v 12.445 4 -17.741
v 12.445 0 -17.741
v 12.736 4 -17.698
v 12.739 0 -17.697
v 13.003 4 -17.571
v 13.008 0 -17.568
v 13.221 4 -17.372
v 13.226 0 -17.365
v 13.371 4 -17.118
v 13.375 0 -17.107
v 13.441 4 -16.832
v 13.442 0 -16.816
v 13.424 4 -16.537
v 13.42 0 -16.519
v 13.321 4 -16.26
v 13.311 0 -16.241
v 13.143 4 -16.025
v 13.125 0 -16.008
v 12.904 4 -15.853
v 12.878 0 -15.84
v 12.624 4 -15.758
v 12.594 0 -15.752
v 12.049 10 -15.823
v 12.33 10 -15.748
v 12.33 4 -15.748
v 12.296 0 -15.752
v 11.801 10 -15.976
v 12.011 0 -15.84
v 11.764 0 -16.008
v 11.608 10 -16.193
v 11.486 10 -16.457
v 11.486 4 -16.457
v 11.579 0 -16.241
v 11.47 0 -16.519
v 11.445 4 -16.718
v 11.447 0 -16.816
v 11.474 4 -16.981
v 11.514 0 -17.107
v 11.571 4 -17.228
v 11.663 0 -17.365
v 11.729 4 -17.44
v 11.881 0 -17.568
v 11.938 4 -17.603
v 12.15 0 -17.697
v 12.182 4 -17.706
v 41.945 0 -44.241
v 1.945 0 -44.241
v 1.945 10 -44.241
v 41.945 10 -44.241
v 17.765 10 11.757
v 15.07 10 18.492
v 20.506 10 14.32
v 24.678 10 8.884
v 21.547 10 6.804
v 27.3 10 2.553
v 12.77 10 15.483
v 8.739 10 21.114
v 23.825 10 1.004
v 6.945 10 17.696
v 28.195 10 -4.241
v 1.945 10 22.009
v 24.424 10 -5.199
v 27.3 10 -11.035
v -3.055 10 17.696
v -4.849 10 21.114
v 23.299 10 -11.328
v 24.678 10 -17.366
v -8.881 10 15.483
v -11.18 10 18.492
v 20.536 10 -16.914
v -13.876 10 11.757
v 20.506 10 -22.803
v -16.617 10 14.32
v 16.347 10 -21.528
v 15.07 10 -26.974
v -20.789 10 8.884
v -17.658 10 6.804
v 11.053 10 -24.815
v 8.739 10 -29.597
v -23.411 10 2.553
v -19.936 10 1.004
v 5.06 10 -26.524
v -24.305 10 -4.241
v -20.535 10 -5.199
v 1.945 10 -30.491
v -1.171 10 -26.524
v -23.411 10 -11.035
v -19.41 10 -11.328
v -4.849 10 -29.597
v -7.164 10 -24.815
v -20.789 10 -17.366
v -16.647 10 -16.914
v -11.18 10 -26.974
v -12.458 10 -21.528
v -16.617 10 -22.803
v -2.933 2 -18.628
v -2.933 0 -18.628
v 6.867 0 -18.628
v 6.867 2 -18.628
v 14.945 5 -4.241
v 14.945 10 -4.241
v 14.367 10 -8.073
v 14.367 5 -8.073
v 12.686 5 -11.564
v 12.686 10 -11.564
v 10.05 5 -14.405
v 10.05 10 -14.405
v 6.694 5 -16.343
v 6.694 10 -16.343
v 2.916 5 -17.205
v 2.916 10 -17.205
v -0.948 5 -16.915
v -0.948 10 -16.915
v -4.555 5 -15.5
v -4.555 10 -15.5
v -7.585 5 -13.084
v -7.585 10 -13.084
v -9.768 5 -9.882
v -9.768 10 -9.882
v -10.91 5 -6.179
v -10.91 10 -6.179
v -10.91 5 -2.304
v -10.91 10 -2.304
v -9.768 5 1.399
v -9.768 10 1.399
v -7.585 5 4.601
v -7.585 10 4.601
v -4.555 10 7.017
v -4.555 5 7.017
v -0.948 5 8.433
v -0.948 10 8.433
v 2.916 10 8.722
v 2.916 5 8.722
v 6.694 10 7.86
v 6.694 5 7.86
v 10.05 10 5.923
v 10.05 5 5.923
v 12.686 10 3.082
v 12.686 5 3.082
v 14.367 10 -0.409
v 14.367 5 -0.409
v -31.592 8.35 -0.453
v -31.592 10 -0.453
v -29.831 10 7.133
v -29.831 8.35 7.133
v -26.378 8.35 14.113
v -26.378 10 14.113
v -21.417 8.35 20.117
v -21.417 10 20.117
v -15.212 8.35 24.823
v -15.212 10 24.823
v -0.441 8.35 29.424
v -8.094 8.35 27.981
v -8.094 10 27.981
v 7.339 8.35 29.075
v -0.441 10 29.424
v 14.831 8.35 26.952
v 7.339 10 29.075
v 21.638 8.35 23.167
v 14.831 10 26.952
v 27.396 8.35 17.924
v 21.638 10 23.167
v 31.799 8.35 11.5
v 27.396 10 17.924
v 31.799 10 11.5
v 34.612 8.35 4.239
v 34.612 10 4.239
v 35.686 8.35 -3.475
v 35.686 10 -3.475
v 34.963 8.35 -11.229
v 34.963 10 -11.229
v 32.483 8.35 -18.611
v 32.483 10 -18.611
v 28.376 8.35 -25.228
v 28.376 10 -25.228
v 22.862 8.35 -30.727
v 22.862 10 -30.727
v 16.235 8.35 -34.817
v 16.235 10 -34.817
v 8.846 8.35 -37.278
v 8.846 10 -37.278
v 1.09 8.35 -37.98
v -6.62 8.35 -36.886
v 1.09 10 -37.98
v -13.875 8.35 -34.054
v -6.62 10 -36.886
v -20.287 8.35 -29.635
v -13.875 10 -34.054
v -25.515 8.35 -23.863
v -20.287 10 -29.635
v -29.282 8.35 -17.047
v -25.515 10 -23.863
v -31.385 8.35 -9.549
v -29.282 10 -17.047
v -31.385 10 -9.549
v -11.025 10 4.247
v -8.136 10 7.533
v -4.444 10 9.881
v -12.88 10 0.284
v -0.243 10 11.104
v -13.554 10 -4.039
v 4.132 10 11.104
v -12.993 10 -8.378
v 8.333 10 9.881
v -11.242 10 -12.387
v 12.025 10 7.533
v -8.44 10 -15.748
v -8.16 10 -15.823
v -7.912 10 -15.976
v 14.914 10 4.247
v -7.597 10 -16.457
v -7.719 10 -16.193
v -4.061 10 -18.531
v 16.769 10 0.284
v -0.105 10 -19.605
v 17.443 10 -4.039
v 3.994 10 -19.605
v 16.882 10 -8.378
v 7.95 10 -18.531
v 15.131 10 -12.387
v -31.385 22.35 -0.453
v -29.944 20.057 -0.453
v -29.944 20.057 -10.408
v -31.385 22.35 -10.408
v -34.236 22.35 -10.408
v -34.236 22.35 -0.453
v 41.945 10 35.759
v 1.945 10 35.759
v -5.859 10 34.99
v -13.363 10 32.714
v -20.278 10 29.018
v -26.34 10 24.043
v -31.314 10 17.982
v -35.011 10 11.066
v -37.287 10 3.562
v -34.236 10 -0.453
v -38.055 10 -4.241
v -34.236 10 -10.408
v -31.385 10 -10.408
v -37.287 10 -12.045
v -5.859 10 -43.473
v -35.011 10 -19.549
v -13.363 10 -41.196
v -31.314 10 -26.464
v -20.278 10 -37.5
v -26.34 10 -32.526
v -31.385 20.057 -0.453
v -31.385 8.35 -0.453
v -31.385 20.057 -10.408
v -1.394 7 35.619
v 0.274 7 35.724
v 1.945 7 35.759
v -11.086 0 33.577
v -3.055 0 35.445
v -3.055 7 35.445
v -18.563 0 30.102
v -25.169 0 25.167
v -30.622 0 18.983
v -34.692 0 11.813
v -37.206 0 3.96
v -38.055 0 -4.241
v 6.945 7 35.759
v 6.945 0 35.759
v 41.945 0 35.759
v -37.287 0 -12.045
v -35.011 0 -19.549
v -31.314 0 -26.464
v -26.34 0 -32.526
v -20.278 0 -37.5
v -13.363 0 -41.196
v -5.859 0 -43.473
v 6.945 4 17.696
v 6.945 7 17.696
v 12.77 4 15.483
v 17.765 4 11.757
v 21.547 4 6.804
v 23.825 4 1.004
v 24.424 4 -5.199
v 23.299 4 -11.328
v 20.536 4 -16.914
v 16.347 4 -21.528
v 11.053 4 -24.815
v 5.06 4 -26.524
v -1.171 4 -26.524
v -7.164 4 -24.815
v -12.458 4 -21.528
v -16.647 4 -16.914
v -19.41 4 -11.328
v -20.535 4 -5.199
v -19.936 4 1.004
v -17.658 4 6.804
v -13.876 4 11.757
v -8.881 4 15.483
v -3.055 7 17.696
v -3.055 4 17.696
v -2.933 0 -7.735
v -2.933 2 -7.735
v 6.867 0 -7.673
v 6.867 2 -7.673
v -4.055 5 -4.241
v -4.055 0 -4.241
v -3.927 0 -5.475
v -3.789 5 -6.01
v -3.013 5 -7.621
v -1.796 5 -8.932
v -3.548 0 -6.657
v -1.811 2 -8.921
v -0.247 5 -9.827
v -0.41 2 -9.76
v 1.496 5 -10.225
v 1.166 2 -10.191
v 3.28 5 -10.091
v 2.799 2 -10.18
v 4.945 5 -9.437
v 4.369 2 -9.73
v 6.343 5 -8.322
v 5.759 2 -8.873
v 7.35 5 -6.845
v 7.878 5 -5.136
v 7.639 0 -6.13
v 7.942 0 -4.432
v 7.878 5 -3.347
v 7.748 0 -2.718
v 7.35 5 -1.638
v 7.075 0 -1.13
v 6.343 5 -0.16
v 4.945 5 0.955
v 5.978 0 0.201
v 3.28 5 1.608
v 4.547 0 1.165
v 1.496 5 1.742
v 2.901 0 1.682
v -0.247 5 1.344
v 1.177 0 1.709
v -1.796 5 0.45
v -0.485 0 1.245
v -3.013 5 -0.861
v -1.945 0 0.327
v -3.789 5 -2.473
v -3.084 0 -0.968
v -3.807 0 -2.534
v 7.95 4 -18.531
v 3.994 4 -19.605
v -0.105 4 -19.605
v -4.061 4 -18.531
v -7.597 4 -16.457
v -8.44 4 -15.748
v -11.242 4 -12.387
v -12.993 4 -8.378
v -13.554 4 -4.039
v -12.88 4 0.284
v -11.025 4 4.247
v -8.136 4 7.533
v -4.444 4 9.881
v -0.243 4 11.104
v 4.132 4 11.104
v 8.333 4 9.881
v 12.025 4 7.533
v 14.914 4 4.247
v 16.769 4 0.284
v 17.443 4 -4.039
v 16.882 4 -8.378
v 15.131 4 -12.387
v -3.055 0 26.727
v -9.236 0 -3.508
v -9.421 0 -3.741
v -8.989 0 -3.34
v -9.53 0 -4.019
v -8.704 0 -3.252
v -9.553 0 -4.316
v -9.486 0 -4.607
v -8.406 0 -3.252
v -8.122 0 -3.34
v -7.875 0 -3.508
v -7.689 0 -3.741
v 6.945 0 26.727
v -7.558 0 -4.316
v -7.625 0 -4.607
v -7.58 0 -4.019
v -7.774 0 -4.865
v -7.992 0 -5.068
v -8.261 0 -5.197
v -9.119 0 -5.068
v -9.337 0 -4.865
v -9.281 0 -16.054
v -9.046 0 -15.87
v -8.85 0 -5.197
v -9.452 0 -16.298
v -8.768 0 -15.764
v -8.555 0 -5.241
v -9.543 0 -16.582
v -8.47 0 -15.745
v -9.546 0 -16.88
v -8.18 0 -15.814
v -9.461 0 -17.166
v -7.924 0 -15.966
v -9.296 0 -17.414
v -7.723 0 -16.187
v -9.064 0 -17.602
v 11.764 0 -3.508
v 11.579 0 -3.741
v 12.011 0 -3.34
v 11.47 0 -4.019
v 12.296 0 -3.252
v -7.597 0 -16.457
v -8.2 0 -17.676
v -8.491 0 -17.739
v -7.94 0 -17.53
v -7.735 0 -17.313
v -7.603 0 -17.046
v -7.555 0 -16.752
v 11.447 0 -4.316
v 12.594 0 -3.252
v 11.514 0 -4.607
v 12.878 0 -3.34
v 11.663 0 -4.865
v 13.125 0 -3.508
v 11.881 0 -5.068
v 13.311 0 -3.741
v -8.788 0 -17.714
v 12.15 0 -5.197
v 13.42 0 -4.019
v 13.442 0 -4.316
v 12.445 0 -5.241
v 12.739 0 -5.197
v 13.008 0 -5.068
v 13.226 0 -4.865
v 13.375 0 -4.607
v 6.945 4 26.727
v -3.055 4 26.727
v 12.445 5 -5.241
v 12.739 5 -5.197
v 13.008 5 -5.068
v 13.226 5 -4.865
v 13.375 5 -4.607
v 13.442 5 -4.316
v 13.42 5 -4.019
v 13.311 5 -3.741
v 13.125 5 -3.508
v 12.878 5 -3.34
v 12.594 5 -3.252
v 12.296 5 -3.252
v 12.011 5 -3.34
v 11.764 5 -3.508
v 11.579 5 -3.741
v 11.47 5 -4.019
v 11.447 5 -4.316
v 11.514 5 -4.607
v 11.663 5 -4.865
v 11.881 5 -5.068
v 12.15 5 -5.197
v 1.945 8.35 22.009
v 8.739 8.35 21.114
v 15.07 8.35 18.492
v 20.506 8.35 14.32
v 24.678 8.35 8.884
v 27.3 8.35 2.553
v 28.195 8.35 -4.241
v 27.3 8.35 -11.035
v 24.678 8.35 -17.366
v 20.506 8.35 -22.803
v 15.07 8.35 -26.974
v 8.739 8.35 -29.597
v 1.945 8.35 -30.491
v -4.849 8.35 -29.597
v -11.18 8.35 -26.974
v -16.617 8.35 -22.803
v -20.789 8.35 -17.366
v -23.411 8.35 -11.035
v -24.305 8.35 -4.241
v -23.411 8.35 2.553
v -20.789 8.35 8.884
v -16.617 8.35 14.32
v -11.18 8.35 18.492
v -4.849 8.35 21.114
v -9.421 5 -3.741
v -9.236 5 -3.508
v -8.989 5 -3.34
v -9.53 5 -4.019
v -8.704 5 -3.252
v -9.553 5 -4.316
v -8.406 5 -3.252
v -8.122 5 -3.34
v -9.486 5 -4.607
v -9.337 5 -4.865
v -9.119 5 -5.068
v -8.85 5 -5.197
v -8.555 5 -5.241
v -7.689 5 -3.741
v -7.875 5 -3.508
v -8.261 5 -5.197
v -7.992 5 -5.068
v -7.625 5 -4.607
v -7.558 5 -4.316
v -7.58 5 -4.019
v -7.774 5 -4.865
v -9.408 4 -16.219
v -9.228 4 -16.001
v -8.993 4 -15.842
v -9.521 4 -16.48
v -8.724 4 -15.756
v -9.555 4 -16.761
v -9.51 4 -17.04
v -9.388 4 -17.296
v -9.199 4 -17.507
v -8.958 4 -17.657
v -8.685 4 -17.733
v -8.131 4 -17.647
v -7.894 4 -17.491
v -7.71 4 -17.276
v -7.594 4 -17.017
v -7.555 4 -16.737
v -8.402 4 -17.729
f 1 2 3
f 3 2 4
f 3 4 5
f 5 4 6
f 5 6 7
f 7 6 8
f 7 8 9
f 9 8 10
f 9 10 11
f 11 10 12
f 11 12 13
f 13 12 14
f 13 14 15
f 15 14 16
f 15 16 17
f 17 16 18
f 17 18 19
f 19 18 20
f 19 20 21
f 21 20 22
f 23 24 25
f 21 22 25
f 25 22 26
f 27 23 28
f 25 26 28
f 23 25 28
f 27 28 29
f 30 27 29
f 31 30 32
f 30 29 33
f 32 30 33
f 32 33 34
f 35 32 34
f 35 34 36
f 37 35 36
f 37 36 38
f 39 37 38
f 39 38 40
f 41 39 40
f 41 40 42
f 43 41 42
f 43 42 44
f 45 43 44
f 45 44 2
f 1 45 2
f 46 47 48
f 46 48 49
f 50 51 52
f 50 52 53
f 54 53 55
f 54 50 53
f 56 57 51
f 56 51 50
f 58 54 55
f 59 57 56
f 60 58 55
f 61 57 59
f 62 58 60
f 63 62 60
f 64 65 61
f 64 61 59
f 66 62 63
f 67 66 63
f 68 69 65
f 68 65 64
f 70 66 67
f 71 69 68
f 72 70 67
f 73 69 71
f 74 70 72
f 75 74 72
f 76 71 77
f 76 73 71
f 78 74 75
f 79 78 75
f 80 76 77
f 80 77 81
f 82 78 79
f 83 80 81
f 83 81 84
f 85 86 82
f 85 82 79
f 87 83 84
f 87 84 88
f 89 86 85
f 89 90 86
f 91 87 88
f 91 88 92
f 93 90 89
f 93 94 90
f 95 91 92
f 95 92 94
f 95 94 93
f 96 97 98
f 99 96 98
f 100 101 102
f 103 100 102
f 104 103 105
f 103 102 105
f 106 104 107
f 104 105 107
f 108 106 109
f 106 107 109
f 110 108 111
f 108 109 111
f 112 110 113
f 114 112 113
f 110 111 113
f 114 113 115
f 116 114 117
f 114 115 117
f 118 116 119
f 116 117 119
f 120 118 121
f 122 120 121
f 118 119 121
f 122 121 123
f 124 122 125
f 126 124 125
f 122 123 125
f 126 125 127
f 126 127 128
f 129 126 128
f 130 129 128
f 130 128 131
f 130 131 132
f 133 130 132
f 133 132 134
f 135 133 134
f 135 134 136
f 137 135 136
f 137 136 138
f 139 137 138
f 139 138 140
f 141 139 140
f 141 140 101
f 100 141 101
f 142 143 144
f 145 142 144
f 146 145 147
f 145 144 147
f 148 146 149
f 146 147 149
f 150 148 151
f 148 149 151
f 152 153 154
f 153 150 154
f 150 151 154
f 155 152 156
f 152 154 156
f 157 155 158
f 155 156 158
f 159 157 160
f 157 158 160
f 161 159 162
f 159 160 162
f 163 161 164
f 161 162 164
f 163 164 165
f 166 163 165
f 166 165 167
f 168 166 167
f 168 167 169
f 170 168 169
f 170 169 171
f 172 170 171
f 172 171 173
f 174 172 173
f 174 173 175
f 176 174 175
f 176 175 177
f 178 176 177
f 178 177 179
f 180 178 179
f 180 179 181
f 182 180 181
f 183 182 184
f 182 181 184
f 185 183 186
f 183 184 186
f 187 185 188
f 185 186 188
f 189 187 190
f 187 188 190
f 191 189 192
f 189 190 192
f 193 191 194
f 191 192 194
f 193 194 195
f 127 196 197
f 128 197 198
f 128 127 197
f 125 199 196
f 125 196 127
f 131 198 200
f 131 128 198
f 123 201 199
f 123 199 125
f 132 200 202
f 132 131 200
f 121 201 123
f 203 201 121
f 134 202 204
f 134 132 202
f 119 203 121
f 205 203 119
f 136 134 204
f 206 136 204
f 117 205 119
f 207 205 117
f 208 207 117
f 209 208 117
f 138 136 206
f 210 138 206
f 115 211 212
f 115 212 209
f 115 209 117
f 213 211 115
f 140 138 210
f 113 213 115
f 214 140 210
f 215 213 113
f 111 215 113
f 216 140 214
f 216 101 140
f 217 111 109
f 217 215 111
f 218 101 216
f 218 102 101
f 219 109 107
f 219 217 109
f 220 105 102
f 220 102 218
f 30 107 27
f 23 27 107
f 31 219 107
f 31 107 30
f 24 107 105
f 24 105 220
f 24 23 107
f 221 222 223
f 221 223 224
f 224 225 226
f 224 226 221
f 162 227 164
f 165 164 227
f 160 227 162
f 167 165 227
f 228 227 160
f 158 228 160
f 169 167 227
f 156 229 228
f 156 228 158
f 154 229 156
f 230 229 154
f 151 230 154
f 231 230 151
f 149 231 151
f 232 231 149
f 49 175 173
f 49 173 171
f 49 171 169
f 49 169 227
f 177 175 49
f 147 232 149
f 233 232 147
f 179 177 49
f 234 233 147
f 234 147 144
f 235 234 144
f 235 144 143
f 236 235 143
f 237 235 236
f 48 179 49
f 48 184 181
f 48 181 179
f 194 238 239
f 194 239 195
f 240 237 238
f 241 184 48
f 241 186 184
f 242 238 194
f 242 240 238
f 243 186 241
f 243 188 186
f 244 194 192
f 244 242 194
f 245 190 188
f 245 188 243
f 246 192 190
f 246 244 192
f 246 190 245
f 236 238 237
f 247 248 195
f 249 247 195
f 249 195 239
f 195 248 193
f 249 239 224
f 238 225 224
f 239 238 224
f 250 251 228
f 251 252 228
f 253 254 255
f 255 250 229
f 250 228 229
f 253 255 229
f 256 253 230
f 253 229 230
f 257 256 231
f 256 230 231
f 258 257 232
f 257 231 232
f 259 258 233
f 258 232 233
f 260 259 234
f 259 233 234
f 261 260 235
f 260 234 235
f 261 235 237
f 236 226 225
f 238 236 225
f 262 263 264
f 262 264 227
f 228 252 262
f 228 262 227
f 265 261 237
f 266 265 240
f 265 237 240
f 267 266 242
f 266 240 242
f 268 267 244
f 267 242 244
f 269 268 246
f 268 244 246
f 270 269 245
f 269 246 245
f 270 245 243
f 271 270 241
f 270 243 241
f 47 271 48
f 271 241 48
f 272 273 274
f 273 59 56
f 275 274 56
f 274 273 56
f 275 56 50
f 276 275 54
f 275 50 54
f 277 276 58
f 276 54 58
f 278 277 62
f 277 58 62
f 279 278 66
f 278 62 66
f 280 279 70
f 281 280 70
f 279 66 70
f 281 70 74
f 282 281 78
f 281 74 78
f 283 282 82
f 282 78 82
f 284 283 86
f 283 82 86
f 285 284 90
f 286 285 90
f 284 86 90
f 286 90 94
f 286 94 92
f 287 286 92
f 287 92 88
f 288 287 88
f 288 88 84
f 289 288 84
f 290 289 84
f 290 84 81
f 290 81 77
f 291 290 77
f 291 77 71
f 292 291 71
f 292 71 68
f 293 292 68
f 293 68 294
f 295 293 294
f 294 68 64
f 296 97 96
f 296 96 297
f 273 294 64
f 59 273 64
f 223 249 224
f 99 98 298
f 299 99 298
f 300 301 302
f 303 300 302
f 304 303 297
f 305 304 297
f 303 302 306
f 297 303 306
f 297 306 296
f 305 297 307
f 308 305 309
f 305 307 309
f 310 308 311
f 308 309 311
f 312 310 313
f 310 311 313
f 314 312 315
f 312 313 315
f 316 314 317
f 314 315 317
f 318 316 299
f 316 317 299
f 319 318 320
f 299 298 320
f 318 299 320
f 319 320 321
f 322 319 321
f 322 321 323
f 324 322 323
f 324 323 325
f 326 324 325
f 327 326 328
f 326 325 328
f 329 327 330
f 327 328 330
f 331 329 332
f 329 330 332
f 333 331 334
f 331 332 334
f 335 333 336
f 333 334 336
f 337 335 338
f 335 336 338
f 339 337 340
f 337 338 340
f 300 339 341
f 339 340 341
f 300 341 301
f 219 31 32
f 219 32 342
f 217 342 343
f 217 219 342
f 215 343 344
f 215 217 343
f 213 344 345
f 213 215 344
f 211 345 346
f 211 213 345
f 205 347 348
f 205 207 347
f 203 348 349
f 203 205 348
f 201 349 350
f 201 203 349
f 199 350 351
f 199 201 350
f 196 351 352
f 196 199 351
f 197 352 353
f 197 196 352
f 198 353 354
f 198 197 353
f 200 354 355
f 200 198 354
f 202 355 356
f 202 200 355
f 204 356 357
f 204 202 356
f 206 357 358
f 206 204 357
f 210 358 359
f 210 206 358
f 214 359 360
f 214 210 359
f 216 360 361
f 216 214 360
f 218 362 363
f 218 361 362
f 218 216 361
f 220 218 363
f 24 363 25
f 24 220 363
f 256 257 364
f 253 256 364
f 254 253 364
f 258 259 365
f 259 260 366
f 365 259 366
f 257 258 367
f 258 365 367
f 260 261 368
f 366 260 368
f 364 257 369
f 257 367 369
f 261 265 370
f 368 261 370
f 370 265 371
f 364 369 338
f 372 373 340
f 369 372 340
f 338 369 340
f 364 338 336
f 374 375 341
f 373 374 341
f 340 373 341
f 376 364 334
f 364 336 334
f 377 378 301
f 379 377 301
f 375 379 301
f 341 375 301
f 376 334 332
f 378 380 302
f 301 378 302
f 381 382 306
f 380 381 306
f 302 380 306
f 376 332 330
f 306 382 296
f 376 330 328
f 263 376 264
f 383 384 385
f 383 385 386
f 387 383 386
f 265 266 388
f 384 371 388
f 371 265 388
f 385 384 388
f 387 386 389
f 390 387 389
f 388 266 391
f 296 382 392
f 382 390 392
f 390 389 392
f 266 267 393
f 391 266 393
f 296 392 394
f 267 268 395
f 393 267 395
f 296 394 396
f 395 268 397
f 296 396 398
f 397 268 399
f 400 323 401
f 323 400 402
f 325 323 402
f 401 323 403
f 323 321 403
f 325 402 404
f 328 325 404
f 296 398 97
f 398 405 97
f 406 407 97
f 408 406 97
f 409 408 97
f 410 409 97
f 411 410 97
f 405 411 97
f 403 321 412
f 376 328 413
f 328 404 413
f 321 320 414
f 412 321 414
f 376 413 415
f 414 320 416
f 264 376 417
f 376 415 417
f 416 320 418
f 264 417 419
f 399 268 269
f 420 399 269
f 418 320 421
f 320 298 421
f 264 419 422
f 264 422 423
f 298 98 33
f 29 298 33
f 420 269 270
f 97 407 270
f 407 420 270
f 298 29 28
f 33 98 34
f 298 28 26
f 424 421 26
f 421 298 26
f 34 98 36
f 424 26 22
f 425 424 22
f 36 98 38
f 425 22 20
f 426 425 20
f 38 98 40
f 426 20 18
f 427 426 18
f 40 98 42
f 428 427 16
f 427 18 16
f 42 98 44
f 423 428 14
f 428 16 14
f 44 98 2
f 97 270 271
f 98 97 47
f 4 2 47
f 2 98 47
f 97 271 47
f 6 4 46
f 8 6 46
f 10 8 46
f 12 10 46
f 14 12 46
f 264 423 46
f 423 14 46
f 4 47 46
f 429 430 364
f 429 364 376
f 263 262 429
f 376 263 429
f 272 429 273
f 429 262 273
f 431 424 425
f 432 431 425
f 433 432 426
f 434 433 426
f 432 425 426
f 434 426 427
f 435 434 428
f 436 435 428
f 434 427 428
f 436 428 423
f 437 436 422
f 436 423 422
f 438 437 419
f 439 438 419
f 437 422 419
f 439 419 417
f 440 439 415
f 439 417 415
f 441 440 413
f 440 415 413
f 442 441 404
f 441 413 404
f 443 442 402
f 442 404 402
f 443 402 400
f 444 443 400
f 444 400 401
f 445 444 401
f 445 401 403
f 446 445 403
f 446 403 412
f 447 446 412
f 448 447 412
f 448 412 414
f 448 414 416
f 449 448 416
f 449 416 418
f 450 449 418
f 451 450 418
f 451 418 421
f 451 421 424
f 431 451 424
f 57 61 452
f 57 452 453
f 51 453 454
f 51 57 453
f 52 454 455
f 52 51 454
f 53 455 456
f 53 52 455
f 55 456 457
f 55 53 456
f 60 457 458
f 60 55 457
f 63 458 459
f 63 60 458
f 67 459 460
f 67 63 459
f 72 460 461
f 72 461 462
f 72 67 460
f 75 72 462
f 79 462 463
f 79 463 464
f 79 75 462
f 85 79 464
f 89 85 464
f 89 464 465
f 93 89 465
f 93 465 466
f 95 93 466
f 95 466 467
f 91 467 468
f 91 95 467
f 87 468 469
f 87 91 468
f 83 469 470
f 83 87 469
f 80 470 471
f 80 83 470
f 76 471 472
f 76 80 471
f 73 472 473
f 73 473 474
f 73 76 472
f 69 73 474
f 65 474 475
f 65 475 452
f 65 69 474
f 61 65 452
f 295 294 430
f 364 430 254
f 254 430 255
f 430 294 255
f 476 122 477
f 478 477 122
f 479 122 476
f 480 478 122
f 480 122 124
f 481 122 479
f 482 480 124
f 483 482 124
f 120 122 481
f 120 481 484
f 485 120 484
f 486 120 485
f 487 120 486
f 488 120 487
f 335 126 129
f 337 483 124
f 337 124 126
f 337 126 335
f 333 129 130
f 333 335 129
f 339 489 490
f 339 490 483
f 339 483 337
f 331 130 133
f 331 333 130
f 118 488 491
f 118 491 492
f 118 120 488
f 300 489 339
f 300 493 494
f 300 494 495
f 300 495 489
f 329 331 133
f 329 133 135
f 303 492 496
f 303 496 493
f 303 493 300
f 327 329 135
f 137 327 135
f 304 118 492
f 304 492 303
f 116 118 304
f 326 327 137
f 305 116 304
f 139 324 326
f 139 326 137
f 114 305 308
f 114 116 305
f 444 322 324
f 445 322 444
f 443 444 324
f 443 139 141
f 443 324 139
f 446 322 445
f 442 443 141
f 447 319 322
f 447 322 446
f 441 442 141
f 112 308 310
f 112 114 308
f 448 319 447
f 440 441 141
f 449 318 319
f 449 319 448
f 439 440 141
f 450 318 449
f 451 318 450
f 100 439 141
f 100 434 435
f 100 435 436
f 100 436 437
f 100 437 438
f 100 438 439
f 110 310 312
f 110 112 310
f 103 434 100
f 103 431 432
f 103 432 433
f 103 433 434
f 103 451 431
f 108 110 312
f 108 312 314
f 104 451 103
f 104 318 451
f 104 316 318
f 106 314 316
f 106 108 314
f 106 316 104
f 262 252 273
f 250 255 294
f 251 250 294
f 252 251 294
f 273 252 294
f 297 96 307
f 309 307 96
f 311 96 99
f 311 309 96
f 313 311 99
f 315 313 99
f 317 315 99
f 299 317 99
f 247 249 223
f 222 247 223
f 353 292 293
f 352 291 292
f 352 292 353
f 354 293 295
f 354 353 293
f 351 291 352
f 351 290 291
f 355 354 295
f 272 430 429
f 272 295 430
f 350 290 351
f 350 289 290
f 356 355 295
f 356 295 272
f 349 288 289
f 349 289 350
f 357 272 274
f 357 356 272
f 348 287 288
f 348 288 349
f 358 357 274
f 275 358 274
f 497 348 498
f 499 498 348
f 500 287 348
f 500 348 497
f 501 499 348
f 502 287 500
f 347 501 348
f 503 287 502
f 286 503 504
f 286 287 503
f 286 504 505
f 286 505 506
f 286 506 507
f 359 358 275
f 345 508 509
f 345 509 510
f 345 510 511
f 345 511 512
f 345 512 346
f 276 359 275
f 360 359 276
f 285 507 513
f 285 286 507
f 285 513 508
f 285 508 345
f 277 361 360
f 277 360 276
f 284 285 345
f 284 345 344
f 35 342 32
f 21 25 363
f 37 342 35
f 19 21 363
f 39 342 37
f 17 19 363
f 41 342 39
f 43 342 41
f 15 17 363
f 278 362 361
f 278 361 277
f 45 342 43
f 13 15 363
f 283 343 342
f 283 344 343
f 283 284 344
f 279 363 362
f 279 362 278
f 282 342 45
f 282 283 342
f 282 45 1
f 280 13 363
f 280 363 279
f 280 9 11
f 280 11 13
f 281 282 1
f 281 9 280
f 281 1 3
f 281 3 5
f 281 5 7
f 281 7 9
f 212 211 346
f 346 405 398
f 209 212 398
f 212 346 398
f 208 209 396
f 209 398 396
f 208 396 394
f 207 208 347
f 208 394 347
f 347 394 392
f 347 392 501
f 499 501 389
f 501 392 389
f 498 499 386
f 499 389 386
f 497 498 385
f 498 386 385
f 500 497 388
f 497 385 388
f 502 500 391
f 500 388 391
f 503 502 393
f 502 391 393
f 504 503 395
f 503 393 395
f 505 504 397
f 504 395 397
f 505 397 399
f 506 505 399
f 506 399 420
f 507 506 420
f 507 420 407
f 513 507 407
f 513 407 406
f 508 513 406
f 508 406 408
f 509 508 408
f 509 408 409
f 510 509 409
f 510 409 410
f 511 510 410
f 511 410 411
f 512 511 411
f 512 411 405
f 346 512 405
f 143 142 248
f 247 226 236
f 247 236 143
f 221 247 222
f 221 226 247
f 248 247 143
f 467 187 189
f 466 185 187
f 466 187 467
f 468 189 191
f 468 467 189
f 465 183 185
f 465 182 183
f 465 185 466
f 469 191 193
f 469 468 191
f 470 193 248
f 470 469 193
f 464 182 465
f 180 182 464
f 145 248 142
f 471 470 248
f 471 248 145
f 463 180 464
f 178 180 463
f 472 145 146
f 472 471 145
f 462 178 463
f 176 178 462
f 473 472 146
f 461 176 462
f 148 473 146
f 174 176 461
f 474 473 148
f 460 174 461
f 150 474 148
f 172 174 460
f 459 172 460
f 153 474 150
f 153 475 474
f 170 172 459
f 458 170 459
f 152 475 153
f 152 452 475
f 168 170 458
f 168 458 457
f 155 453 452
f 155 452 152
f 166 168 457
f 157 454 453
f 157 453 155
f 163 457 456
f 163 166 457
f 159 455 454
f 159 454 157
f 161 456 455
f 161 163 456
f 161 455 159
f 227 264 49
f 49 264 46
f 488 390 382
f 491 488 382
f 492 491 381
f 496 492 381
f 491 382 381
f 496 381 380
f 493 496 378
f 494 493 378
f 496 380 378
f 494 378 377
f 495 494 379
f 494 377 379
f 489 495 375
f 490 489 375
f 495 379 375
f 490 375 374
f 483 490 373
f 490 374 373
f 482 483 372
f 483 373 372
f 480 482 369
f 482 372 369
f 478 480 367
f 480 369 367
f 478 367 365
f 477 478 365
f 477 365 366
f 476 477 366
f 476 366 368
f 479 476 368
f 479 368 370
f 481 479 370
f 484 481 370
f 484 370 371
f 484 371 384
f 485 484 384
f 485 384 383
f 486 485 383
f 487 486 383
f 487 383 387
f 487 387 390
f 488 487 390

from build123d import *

# Parameters (mm, degrees)
SKETCH28_W                                   = 80
SKETCH28_H                                   = 80
BOSS_EXTRUDE1_DEPTH                          = 10
CBORE_FOR_M10_CHEESE_HEAD_SCREW1_D           = 12
CBORE_FOR_M10_CHEESE_HEAD_SCREW1_CBORE_D     = 26
CBORE_FOR_M10_CHEESE_HEAD_SCREW1_CBORE_DEPTH = 5
SKETCH37_R                                   = 22.5
SKETCH37_R_2                                 = 15.5
CUT_EXTRUDE2_DEPTH                           = 6
CUT_EXTRUDE6_DEPTH                           = 6
SKETCH40_W                                   = 18.062589032
SKETCH40_H                                   = 3
BOSS_EXTRUDE7_DEPTH                          = 13
SKETCH47_W                                   = 10
SKETCH47_H                                   = 9.031294516
CUT_EXTRUDE12_DEPTH                          = 10
SKETCH41_R                                   = 33.75
SKETCH41_R_2                                 = 26.25
CUT_EXTRUDE7_DEPTH                           = 1.65
SKETCH36_R                                   = 1
CUT_EXTRUDE13_DEPTH                          = 10
SKETCH42_W                                   = 9.8
SKETCH42_H                                   = 11.037342061
CUT_EXTRUDE8_DEPTH                           = 2
CUT_EXTRUDE11_DEPTH                          = 20
SKETCH45_W                                   = 2.851047628
SKETCH45_H                                   = 9.955339391
BOSS_EXTRUDE8_DEPTH                          = 14
BOSS_EXTRUDE9_START                          = -9.955339
BOSS_EXTRUDE9_DEPTH                          = 9.955339


with BuildPart() as part:
    # Sketch28 → Boss-Extrude1 (new body)
    with BuildSketch(Plane(origin=(0, 0, 0), x_dir=(1, 0, 0), z_dir=(0, 1, 0))):
        with Locations((1.944585414, 4.241283073)):
            Rectangle(SKETCH28_W, SKETCH28_H)
    extrude(amount=BOSS_EXTRUDE1_DEPTH)

    # CBORE for M10 Cheese Head Screw1 (through all)
    with Locations(Plane(origin=(0, 10, 0), x_dir=(1, 0, 0), z_dir=(0, 1, 0))):
        with Locations((1.944585414, 4.241283073)):
            CounterBoreHole(CBORE_FOR_M10_CHEESE_HEAD_SCREW1_D / 2, CBORE_FOR_M10_CHEESE_HEAD_SCREW1_CBORE_D / 2, CBORE_FOR_M10_CHEESE_HEAD_SCREW1_CBORE_DEPTH)

    # Sketch37 → Cut-Extrude2 (cut)
    with BuildSketch(Plane(origin=(0, 10, 0), x_dir=(1, 0, 0), z_dir=(0, 1, 0))):
        with Locations(Location((1.944585414, 4.241283073, 0), (0, 0, 270))):
            Circle(SKETCH37_R)
        with Locations(Location((1.944585414, 4.241283073, 0), (0, 0, 270))):
            Circle(SKETCH37_R_2, mode=Mode.SUBTRACT)
    extrude(amount=-CUT_EXTRUDE2_DEPTH, mode=Mode.SUBTRACT)

    # Sketch39 → Cut-Extrude6 (cut)
    with BuildSketch(Plane(origin=(0, 10, 0), x_dir=(1, 0, 0), z_dir=(0, 1, 0))):
        with BuildLine():
            Line((6.944585414, -35.758716927), (6.944585414, -17.696127895))
            ThreePointArc((6.944585414, -17.696127895), (1.944585414, -18.258716927), (-3.055414586, -17.696127895))
            Line((-3.055414586, -17.696127895), (-3.055414586, -35.758716927))
            Line((-3.055414586, -35.758716927), (1.944585414, -35.758716927))
            Line((1.944585414, -35.758716927), (6.944585414, -35.758716927))
        make_face()
    extrude(amount=-CUT_EXTRUDE6_DEPTH, mode=Mode.SUBTRACT)

    # Sketch40 → Boss-Extrude7 (add)
    with BuildSketch(Plane(origin=(-3.055414586, 0, 0), x_dir=(0, 0, -1), z_dir=(1, 0, 0))):
        with Locations((-26.727422411, 8.5)):
            Rectangle(SKETCH40_W, SKETCH40_H)
    extrude(amount=BOSS_EXTRUDE7_DEPTH)

    # Sketch47 → Cut-Extrude12 (cut)
    with BuildSketch(Plane(origin=(0, 4, 0), x_dir=(1, 0, 0), z_dir=(0, 1, 0))):
        with Locations((1.944585414, -31.243069669)):
            Rectangle(SKETCH47_W, SKETCH47_H)
    extrude(amount=-CUT_EXTRUDE12_DEPTH, mode=Mode.SUBTRACT)

    # Sketch41 → Cut-Extrude7 (cut)
    with BuildSketch(Plane(origin=(0, 10, 0), x_dir=(1, 0, 0), z_dir=(0, 1, 0))):
        with Locations(Location((1.944585414, 4.241283073, 0), (0, 0, 270))):
            Circle(SKETCH41_R)
        with Locations(Location((1.944585414, 4.241283073, 0), (0, 0, 270))):
            Circle(SKETCH41_R_2, mode=Mode.SUBTRACT)
    extrude(amount=-CUT_EXTRUDE7_DEPTH, mode=Mode.SUBTRACT)

    # Sketch36 → Cut-Extrude13 (cut)
    with BuildSketch(Plane.XZ):
        with Locations(Location((12.444585414, -16.741283073, 0), (0, 0, 270))):
            Circle(SKETCH36_R)
        with Locations(Location((12.444585414, -4.241283073, 0), (0, 0, 270))):
            Circle(SKETCH36_R)
        with Locations(Location((-8.555414586, -16.741283073, 0), (0, 0, 16.545854879))):
            Circle(SKETCH36_R)
        with Locations(Location((-8.555414586, -4.241283073, 0), (0, 0, 270))):
            Circle(SKETCH36_R)
    extrude(amount=-CUT_EXTRUDE13_DEPTH, mode=Mode.SUBTRACT)

    # Sketch42 → Cut-Extrude8 (cut)
    with BuildSketch(Plane.XZ):
        with Locations((1.966640169, -13.109663986)):
            Rectangle(SKETCH42_W, SKETCH42_H)
    extrude(amount=-CUT_EXTRUDE8_DEPTH, mode=Mode.SUBTRACT)

    # Sketch43 → Cut-Extrude11 (cut)
    with BuildSketch(Plane(origin=(0, 10, 0), x_dir=(1, 0, 0), z_dir=(0, 1, 0))):
        with BuildLine():
            ThreePointArc((-38.055414586, 4.241282966), (-26.339685871, 32.525554283), (1.944585414, 44.241283073))
            Line((1.944585414, 44.241283073), (-38.055414586, 44.241283073))
            Line((-38.055414586, 44.241283073), (-38.055414586, 4.241282966))
        make_face()
        with BuildLine():
            ThreePointArc((1.944585414, -35.758716927), (-26.339685795, -24.042988212), (-38.055414586, 4.241282966))
            Line((-38.055414586, 4.241282966), (-38.055414586, -35.758716927))
            Line((-38.055414586, -35.758716927), (1.944585414, -35.758716927))
        make_face()
    extrude(amount=-CUT_EXTRUDE11_DEPTH, mode=Mode.SUBTRACT)

    # Sketch45 → Boss-Extrude8 (add)
    with BuildSketch(Plane(origin=(0, 8.35, 0), x_dir=(1, 0, 0), z_dir=(0, 1, 0))):
        with Locations((-32.810971356, 5.43037333)):
            Rectangle(SKETCH45_W, SKETCH45_H)
    extrude(amount=BOSS_EXTRUDE8_DEPTH)

    # Sketch46 → Boss-Extrude9 (add)
    with BuildSketch(Plane.XY.offset(-0.452703634).offset(BOSS_EXTRUDE9_START)):
        Polygon((-31.385447542, 22.35), (-31.385447542, 20.057188555), (-29.944471524, 20.057188555), align=None)
    extrude(amount=BOSS_EXTRUDE9_DEPTH)


solid = part.part
